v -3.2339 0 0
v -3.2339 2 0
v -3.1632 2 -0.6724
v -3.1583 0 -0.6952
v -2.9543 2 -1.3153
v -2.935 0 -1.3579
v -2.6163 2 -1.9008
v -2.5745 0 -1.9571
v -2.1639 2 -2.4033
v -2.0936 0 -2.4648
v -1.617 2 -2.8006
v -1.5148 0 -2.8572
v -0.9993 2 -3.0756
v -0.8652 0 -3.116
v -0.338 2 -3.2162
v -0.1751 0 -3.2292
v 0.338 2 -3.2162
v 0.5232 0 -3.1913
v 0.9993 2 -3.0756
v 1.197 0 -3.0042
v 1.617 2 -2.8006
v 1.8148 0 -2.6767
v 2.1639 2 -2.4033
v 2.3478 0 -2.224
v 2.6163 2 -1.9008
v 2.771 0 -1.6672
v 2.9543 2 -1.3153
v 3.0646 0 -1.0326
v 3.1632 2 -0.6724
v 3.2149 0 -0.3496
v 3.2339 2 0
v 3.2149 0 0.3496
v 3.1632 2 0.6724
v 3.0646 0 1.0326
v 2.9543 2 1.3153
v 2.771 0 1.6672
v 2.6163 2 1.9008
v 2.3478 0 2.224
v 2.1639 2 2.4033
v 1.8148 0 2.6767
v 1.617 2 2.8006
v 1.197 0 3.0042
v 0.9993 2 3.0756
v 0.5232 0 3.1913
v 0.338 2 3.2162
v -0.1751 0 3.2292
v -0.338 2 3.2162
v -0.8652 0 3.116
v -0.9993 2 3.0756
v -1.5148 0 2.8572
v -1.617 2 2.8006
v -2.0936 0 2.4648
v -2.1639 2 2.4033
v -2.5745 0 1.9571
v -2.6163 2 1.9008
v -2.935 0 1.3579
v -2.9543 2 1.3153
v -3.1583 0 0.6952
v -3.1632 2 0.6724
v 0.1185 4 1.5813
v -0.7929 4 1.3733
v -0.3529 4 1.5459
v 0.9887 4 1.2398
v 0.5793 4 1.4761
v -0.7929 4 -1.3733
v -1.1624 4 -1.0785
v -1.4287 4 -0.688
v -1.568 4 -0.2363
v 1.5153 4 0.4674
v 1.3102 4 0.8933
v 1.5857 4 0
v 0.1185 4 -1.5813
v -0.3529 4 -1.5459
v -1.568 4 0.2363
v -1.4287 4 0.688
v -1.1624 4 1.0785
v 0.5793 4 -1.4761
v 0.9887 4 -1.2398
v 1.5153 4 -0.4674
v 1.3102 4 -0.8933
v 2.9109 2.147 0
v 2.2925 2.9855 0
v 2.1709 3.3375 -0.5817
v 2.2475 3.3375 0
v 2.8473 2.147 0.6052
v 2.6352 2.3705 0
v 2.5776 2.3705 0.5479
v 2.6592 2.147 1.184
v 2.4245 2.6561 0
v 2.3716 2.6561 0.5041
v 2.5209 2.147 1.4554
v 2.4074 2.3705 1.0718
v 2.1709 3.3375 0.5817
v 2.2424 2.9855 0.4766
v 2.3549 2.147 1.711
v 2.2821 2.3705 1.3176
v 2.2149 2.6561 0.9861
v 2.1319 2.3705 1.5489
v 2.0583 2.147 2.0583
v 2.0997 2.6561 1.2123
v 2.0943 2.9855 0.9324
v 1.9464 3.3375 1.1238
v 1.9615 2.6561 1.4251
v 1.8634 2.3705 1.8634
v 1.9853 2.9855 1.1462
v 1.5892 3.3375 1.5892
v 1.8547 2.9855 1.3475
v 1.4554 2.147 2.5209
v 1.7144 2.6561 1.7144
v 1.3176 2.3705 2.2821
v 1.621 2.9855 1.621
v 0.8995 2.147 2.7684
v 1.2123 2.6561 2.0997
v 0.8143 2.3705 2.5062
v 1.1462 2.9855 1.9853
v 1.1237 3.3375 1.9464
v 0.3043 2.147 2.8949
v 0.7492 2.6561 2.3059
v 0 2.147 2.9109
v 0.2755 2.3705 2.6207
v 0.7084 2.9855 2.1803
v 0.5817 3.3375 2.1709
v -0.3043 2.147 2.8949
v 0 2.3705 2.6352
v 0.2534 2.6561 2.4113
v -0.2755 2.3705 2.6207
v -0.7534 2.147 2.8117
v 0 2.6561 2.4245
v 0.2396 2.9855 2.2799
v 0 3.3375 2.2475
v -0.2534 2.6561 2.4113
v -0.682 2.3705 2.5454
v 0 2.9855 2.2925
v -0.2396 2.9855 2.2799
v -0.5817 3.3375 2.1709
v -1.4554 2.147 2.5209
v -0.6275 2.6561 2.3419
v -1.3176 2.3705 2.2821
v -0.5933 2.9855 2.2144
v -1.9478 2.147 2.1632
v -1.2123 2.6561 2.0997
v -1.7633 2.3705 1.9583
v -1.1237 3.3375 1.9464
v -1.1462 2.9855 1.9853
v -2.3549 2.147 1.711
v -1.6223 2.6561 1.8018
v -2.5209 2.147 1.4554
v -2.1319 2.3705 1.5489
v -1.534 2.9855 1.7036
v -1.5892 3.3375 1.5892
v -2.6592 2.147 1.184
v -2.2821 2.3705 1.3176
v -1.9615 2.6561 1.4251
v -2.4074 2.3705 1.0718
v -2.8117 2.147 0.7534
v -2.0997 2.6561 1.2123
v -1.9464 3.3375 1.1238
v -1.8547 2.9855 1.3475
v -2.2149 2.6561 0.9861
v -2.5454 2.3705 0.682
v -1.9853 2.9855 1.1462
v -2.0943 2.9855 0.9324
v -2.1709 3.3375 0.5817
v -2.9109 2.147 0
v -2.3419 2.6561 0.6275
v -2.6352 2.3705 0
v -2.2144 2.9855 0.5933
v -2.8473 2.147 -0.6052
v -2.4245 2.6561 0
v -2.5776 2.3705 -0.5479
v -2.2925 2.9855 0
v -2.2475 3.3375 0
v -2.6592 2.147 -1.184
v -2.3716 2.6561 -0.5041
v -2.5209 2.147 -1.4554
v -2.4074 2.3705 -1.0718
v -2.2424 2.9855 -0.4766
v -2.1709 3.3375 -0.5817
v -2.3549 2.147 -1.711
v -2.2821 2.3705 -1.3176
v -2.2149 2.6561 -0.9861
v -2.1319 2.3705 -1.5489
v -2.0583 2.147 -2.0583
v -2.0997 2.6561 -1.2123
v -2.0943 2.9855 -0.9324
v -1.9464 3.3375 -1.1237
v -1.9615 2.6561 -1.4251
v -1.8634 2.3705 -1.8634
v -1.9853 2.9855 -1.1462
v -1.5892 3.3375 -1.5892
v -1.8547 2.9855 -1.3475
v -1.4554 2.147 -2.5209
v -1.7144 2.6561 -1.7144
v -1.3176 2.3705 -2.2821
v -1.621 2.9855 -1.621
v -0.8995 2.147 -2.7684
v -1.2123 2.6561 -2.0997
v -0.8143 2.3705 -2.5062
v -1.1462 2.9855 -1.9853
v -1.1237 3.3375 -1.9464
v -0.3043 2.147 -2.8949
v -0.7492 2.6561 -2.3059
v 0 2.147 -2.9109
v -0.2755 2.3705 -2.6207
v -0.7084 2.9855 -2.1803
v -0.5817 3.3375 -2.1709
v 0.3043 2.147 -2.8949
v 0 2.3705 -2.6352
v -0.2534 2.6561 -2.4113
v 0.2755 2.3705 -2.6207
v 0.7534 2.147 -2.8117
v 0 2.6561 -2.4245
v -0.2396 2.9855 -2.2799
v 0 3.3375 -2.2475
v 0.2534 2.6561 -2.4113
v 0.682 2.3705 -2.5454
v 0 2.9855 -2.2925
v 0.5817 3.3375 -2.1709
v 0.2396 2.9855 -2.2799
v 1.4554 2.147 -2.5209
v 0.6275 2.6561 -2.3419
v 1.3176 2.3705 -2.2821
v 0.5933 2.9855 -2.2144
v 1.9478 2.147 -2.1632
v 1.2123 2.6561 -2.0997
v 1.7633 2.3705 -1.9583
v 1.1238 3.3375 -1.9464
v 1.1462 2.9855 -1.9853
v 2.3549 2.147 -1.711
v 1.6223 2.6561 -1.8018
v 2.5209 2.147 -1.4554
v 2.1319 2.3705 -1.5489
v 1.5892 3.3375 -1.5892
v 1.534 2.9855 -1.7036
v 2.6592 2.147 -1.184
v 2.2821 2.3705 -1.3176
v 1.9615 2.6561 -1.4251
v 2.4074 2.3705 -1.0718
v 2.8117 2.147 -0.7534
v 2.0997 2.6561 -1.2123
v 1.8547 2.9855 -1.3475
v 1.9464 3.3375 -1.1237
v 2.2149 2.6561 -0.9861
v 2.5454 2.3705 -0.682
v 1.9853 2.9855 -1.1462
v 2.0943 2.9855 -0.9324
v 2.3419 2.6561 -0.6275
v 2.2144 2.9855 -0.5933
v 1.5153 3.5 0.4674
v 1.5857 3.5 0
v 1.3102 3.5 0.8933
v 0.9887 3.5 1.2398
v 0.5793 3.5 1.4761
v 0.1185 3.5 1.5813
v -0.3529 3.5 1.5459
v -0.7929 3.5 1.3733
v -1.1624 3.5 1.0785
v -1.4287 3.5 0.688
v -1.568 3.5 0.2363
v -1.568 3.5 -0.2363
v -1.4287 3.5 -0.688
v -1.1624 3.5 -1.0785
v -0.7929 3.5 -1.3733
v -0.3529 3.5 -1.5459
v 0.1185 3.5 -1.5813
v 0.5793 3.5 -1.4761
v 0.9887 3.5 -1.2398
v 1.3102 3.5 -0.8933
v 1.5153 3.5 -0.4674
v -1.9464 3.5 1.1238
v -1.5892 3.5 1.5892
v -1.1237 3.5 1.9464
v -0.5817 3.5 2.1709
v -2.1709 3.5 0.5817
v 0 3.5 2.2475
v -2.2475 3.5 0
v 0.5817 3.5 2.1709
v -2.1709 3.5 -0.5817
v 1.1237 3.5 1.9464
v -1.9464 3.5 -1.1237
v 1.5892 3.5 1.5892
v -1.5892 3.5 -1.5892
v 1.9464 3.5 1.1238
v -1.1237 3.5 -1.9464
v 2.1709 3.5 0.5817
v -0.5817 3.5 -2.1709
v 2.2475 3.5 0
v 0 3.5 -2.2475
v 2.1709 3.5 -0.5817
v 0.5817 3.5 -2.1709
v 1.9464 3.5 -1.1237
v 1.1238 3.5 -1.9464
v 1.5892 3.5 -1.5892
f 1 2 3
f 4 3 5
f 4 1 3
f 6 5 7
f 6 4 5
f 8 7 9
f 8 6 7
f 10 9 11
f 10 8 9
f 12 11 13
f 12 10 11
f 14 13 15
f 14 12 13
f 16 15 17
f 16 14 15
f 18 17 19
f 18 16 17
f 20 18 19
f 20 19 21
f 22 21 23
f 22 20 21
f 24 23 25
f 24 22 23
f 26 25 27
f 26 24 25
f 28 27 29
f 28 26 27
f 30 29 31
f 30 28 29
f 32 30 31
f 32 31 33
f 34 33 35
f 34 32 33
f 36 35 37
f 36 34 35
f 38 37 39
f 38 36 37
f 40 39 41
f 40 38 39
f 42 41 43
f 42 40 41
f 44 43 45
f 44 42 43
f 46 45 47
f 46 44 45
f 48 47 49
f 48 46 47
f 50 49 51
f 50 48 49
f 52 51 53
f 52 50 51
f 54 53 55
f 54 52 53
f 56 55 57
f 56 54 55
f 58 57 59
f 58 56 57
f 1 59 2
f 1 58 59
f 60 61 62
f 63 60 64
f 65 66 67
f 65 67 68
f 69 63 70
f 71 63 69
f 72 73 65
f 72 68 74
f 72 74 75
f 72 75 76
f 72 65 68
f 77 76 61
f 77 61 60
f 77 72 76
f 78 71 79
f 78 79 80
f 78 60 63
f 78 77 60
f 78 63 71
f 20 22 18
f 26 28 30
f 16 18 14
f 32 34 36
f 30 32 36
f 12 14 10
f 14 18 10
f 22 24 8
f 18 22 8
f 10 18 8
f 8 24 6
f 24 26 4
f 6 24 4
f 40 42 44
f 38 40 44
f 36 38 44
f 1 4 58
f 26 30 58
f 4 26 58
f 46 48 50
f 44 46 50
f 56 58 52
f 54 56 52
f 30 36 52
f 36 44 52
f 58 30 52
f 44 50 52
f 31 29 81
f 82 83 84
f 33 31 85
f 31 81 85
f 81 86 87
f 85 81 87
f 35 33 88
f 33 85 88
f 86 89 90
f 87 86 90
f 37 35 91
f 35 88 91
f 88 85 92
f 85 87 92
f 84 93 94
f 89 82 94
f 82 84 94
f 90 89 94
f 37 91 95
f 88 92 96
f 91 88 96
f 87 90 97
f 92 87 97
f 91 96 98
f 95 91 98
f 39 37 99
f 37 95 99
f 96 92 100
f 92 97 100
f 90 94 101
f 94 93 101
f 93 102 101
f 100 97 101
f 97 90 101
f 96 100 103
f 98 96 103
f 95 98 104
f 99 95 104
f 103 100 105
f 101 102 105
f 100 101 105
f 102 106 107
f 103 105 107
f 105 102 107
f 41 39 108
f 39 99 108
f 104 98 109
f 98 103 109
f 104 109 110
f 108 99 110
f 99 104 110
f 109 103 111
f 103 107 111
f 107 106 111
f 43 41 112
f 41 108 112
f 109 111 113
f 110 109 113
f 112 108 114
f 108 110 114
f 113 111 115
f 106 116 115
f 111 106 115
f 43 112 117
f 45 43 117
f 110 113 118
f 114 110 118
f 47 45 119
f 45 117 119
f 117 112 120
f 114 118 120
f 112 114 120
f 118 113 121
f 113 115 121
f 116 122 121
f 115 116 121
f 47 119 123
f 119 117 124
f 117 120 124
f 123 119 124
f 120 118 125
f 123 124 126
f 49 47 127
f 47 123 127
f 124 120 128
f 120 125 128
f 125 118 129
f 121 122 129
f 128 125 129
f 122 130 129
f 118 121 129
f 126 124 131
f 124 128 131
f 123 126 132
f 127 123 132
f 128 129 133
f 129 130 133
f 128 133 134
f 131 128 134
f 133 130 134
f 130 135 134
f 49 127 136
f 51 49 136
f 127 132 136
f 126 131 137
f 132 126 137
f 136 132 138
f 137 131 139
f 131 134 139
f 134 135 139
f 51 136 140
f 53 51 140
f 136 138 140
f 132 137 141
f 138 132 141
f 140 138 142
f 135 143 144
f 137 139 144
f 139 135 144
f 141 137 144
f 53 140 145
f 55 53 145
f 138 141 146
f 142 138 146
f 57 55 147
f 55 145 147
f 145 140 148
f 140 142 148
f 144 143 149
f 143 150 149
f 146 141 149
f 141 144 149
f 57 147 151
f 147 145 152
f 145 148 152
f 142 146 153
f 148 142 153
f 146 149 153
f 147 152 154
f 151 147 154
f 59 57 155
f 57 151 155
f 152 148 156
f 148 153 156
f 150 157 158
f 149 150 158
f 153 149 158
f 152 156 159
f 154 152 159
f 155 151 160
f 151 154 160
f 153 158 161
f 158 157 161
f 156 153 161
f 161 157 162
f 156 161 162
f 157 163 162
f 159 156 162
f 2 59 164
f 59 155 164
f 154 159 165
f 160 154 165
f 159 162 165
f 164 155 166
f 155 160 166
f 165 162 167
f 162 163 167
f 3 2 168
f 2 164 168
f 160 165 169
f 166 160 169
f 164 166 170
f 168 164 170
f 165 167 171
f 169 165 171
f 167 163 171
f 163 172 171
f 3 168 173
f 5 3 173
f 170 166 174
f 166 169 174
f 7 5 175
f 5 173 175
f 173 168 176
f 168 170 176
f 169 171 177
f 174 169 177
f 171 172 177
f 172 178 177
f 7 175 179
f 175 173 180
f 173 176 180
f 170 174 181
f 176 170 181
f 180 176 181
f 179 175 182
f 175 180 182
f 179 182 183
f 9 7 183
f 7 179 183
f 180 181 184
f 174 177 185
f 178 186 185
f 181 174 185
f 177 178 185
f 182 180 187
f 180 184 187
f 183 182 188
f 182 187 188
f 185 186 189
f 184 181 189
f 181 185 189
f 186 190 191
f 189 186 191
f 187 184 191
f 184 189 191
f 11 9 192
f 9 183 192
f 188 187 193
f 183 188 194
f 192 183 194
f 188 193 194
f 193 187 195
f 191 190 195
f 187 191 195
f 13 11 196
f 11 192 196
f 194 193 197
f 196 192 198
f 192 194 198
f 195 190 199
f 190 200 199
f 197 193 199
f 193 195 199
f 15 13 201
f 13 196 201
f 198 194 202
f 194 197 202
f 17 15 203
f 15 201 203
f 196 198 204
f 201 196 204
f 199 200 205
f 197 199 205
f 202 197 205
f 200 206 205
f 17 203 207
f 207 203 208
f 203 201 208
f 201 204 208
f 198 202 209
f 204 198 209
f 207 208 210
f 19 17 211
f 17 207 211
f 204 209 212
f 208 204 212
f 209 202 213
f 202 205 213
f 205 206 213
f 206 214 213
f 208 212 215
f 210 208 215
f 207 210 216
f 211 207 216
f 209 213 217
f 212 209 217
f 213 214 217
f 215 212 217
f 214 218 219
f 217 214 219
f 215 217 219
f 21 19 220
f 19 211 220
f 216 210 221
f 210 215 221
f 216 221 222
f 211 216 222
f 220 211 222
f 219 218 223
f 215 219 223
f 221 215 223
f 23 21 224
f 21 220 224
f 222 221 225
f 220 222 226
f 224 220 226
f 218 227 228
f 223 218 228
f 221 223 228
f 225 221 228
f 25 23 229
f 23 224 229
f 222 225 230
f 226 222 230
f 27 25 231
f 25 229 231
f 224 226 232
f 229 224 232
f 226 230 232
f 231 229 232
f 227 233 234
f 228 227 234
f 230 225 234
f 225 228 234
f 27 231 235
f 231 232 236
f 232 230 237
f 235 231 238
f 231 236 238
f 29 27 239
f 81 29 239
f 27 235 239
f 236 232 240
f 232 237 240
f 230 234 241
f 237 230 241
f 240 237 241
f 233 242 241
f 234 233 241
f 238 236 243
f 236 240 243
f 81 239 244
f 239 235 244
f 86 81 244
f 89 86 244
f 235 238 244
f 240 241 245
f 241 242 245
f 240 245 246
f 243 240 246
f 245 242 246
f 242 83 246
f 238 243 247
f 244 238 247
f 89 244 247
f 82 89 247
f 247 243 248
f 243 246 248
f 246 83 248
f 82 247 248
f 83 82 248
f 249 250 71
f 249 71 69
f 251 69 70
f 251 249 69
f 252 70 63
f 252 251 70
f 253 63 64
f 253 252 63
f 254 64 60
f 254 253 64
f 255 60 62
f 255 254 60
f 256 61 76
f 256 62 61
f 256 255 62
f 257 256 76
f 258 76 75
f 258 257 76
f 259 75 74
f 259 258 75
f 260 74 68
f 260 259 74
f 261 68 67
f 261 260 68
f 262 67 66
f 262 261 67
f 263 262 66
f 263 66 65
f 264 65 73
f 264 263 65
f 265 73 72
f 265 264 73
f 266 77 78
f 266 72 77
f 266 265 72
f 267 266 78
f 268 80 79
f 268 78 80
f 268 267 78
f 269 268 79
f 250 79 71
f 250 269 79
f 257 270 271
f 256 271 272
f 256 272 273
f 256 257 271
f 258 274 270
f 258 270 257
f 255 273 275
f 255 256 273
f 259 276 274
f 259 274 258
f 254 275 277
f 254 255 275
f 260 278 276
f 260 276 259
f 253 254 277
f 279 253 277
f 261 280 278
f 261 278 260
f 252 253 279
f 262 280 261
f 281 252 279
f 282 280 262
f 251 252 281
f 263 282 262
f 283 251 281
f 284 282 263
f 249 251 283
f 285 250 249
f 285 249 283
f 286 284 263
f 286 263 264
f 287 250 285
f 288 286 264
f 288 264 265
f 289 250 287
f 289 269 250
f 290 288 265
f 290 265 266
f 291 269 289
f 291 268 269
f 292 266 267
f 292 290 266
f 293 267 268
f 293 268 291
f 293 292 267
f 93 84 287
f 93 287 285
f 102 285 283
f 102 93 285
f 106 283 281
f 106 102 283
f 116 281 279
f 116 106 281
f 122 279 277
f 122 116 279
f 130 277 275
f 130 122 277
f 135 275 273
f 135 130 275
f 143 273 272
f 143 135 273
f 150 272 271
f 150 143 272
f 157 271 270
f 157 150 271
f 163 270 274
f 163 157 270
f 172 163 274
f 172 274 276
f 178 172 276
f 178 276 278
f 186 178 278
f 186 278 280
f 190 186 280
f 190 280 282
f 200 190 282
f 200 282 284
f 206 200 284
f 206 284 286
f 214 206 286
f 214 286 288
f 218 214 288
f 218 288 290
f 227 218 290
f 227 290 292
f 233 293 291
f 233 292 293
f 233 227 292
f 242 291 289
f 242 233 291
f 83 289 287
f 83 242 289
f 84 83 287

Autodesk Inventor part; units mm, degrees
ref_plane "YZ Plane" through (0, 0, 0) normal (1, 0, 0) x (0, 1, 0)
ref_plane "XZ Plane" through (0, 0, 0) normal (0, 1, 0) x (-1, 0, 0)
ref_plane "XY Plane" through (0, 0, 0) normal (0, 0, 1) x (1, 0, 0)
sketch "Sketch1" plane through (0, 0, 0) normal (0, 1, 0) x (-1, 0, 0)
  circle A0 centre (0, 0) radius 3.2339
extrude "Extrusion1" add sketch "Sketch1" along normal blind 2
sketch "Sketch2" plane through (0, 2, 0) normal (0, 1, 0) x (1, 0, 0)
  circle A0 centre (0, 0) radius 2.2475
extrude "Extrusion2" add sketch "Sketch2" along normal blind 1.5
fillet "Fillet1" radius 1.4 1 edges at (-2.2475, 2, 0)
sketch "Sketch3" plane through (0, 3.5, 0) normal (0, 1, 0) x (1, 0, 0)
  circle A0 centre (0, 0) radius 1.5857
extrude "Extrusion3" add sketch "Sketch3" along normal blind 0.5
sketch "Sketch4" plane through (0, 4, 0) normal (0, 1, 0) x (1, 0, 0)
  point P0 (0, 0)
properties part number "SWITCH"
